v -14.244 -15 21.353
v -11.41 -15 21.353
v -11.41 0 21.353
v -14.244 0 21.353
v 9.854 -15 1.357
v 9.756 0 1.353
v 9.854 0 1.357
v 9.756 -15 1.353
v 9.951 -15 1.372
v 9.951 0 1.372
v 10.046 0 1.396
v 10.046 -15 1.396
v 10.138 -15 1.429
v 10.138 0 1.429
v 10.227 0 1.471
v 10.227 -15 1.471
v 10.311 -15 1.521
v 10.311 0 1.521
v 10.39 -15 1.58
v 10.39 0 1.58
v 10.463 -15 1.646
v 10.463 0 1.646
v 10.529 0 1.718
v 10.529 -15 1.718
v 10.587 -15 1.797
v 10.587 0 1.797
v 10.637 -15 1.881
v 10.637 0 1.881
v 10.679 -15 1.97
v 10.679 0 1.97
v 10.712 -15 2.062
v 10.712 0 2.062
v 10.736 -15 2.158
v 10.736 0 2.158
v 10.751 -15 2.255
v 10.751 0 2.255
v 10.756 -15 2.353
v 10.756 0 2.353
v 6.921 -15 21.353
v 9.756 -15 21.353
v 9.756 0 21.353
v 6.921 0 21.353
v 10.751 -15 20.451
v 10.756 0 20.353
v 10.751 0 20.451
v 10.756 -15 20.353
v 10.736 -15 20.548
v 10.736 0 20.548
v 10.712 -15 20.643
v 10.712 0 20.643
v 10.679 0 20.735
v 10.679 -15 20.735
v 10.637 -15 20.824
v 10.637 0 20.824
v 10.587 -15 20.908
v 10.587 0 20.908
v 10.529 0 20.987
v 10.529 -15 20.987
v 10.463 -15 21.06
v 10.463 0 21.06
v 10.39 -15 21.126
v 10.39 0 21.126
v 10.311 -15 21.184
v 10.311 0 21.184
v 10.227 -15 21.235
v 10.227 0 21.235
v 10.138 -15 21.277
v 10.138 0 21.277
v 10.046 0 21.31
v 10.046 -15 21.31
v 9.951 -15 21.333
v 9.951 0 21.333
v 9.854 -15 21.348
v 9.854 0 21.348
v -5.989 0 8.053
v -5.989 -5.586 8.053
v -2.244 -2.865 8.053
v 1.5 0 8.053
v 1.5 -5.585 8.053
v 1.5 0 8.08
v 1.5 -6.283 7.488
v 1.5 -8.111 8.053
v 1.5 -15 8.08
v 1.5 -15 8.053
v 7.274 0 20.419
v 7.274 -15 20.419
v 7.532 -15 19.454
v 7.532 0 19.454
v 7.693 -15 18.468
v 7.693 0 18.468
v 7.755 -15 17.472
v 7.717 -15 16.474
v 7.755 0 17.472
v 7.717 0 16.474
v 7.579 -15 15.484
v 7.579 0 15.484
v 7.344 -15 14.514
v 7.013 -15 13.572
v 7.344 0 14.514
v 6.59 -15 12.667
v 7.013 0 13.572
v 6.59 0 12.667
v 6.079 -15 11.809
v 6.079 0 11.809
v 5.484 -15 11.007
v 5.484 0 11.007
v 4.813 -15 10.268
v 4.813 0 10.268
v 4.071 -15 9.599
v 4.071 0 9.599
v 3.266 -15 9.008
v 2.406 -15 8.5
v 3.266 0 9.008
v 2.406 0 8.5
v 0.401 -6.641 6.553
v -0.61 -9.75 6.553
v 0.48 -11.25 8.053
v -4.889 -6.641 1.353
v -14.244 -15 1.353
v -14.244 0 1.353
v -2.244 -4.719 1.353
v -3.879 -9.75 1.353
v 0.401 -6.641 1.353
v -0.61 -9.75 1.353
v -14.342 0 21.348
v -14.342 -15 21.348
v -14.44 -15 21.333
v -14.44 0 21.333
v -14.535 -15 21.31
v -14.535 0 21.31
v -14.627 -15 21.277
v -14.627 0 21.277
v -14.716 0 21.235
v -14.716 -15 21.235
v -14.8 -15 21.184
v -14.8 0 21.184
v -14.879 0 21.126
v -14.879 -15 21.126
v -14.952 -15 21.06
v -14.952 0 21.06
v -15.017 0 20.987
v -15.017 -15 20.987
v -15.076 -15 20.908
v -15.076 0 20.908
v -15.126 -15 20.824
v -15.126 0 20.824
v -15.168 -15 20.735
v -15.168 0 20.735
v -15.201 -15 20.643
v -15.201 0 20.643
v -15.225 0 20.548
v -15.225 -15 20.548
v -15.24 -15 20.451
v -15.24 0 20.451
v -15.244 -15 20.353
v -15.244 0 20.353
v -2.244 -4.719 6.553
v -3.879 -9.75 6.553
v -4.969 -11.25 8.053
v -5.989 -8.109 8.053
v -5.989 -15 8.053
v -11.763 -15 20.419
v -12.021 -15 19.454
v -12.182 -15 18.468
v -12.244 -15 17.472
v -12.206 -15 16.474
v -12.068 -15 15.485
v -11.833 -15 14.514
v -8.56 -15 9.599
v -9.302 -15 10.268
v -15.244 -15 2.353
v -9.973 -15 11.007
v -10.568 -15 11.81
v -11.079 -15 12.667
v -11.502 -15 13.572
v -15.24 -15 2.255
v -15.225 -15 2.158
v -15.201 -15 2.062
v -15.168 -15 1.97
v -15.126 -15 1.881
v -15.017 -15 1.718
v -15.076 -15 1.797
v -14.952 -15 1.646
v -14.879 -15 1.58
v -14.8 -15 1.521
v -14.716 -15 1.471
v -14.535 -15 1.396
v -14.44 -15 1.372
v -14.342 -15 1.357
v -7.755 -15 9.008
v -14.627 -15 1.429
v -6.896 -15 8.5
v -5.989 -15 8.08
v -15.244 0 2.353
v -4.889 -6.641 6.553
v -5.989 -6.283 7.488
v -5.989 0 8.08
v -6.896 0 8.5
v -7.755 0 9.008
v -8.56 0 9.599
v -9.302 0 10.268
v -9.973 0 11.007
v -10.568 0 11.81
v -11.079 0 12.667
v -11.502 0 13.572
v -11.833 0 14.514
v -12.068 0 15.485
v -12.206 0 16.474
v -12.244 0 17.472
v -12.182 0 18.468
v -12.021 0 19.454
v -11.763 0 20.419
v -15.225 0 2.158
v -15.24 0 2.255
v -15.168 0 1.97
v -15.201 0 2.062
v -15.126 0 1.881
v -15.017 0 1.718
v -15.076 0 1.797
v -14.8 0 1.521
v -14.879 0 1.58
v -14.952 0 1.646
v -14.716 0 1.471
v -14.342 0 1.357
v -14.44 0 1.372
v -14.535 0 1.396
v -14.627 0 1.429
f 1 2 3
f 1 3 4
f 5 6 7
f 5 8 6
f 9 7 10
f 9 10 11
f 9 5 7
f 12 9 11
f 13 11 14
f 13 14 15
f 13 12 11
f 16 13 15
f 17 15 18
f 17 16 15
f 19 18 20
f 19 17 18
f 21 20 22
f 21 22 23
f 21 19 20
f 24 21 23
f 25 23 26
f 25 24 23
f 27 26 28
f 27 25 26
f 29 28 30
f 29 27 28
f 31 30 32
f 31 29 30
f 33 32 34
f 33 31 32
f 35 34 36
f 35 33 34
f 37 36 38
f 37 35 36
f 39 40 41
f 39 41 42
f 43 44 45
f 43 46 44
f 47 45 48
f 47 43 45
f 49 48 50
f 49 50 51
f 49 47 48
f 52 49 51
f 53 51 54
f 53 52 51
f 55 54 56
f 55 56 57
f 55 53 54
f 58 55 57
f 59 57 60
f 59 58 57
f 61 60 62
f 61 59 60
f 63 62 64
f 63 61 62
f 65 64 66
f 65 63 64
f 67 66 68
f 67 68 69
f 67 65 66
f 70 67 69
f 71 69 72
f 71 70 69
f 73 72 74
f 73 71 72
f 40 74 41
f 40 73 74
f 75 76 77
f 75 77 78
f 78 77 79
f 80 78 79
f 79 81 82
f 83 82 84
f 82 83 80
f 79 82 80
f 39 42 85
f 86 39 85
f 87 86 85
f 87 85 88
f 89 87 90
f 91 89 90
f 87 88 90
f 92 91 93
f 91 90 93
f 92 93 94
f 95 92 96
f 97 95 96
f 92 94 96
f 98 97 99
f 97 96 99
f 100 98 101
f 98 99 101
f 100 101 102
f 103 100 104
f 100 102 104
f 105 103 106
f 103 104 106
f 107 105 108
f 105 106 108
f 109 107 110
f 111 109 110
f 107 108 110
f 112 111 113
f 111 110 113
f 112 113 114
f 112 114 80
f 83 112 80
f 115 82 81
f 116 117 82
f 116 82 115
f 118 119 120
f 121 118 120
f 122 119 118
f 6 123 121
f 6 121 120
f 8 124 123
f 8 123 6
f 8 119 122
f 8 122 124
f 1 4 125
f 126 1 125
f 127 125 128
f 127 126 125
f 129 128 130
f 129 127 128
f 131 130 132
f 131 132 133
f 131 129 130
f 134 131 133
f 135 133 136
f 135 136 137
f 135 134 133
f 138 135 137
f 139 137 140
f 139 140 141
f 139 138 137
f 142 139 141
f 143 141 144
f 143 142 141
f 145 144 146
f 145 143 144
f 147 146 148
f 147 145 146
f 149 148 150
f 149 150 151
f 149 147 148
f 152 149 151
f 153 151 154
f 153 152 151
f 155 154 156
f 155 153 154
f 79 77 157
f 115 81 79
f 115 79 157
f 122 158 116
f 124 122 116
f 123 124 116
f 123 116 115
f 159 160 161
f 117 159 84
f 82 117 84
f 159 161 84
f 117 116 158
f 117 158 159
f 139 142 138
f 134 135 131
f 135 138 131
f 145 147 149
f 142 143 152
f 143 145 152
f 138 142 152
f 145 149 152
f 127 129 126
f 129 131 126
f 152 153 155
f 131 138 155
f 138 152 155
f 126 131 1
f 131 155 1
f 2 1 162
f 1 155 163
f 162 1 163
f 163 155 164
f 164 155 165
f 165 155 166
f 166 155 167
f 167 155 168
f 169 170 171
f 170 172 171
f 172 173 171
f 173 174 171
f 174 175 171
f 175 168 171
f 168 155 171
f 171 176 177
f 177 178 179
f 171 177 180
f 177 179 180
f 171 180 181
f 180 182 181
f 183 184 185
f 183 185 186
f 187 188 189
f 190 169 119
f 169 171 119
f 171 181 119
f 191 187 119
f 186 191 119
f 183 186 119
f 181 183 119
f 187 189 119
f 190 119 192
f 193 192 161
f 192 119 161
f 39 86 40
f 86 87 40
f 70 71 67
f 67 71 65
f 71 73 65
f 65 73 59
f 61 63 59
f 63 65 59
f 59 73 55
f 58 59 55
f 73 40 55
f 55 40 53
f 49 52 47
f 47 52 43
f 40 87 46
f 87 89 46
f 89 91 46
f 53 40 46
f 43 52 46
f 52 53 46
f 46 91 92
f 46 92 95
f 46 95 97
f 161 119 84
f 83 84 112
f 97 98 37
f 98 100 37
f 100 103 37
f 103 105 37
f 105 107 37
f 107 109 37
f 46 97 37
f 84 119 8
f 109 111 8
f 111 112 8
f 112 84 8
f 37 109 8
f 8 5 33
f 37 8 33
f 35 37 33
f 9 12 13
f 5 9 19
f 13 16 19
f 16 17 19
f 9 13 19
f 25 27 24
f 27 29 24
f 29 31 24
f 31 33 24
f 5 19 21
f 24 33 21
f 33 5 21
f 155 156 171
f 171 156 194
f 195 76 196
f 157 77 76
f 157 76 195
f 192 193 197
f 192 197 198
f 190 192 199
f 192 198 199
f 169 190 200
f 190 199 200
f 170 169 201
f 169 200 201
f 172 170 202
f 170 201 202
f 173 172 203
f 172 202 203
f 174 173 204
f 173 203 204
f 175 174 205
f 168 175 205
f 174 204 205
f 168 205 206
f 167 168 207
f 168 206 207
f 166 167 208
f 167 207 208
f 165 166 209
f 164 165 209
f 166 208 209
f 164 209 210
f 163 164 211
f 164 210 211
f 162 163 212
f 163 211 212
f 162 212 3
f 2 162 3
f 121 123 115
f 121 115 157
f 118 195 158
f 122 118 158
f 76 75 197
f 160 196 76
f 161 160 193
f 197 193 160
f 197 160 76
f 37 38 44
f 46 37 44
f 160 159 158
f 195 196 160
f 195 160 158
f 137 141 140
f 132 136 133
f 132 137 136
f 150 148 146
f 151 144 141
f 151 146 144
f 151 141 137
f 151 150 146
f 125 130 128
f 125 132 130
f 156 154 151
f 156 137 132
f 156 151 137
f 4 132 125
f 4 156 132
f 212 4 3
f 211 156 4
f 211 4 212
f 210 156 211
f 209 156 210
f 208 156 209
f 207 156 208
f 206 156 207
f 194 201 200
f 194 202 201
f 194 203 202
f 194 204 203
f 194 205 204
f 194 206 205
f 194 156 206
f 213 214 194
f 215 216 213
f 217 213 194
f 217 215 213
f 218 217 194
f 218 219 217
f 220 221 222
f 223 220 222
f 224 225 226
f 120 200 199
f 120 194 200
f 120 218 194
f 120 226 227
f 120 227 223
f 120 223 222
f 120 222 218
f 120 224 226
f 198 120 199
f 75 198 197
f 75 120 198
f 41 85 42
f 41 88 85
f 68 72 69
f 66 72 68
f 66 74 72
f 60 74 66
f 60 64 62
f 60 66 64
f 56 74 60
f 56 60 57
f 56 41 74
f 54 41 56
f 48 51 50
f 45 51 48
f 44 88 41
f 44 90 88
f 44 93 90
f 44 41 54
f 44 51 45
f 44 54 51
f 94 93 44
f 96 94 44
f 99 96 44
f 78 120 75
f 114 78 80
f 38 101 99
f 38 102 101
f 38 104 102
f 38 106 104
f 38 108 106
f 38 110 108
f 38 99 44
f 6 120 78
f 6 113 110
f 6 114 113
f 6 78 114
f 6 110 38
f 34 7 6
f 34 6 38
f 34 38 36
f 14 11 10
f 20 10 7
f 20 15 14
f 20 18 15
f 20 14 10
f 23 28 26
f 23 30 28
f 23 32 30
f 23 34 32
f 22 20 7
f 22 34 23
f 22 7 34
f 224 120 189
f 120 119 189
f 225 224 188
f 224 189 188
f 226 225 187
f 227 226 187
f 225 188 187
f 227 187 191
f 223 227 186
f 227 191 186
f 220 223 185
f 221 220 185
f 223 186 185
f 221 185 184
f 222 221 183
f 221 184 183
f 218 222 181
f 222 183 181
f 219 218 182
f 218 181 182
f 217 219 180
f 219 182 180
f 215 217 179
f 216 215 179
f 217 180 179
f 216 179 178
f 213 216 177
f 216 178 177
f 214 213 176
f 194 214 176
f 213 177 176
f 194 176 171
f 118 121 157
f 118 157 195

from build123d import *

# Parameters (mm, degrees)
F1_DEPTH     = 15
F3_DEPTH     = 8
F4_W         = 7.4894965633
F4_H         = 15
F5_DEPTH     = 8
F6_DEPTH     = 6.7
F7_T4_DEPTH  = 10.9844903399
F7_T10_DEPTH = 10.9844903399
F7_T16_DEPTH = 10.9844903399
F7_T23_DEPTH = 10.9844903399
F7_T29_DEPTH = 10.9844903399
F7_T37_DEPTH = 10.9844903399
F7_T41_DEPTH = 10.9844903399
F7_T48_DEPTH = 10.9844903399
F7_T53_DEPTH = 10.9844903399
F7_T61_DEPTH = 10.9844903399
F7_T66_DEPTH = 10.9844903399
F7_T74_DEPTH = 10.9844903399
F7_T79_DEPTH = 10.9844903399
F7_T86_DEPTH = 10.9844903399
F7_T91_DEPTH = 10.9844903399
F8_R         = 1


# Not quite as in the source:
# - a fillet or chamfer that OpenCascade refuses, or shapes differently, is made with other operations: its cross-section is extruded or revolved along the edge and cut away or added
# - a feature names something its author has since deleted; it is built from what else it names


with BuildPart() as f1:
    # F0 (on Front) → F1 (new body)
    with BuildSketch(Plane.XZ):
        with BuildLine():
            Line((-11.4096143179, 21.3526541356), (-15.244462928, 21.3526541356))
            Line((-15.244462928, 21.3526541356), (-15.244462928, 1.3526541356))
            Line((-15.244462928, 1.3526541356), (10.755537072, 1.3526541356))
            Line((10.755537072, 1.3526541356), (10.755537072, 21.3526541356))
            Line((10.755537072, 21.3526541356), (6.9206884619, 21.3526541356))
            ThreePointArc((6.9206884619, 21.3526541356), (-2.244462928, 7.3526541356), (-11.4096143179, 21.3526541356))
        make_face()
    extrude(amount=F1_DEPTH)

    # F2 (on face) → F3 (cut)
    with BuildSketch(Plane(origin=(0, 0, 1.3526541356), x_dir=(1, 0, 0), z_dir=(0, 0, -1))):
        Polygon((-0.60974224, 9.75), (-3.879183616, 9.75), (-4.8894965633, 6.6405764747), (-2.244462928, 4.7188470506), (0.4005707074, 6.6405764747), align=None)
    extrude(amount=-F3_DEPTH, mode=Mode.SUBTRACT)

    # F4 (on face) → F5 (cut)
    with BuildSketch(Plane(origin=(0, 0, 1.3526541356), x_dir=(1, 0, 0), z_dir=(0, 0, -1))):
        with Locations((-2.2447482816, 7.5)):
            Rectangle(F4_W, F4_H)
        Polygon((0.4005707074, 6.6405764747), (-2.244462928, 4.7188470506), (-4.8894965633, 6.6405764747), (-3.879183616, 9.75), (-0.60974224, 9.75), align=None, mode=Mode.SUBTRACT)
    extrude(amount=-F5_DEPTH, mode=Mode.SUBTRACT)

    # F4 (on face) → F6 (join)
    with BuildSketch(Plane(origin=(0, 0, 1.3526541356), x_dir=(1, 0, 0), z_dir=(0, 0, -1))):
        with Locations((-2.2447482816, 7.5)):
            Rectangle(F4_W, F4_H)
        Polygon((0.4005707074, 6.6405764747), (-2.244462928, 4.7188470506), (-4.8894965633, 6.6405764747), (-3.879183616, 9.75), (-0.60974224, 9.75), align=None, mode=Mode.SUBTRACT)
    extrude(amount=-F6_DEPTH)

    # F7: chamfer of 1.5 on 5 edges, made by hand


with BuildPart() as f7_tool2:
    # F7_s3 → F7_t4 (new body)
    with BuildSketch(Plane(origin=(-0.5921623143, -0.4302311048, 0), x_dir=(0, 0, 1), z_dir=(-0.8090169944, -0.5877852523, 0))):
        Polygon((8.0526541356, -0.9983652494), (6.5526541356, -2.4983652494), (8.0526541356, -2.4983652494), align=None)
    extrude(amount=F7_T4_DEPTH)

    split(bisect_by=Plane(origin=(-3.0193879884, -4.1558310382, 0), x_dir=(0, 0, 1), z_dir=(-0.5877852523, -0.8090169944, 0)), keep=Keep.TOP)

    split(bisect_by=Plane(origin=(-6.3742076477, -2.0711056126, 0), x_dir=(0, 0, 1), z_dir=(0.9510565163, 0.3090169944, 0)), keep=Keep.TOP)


with BuildPart() as f1_1:
    add(f1.part)

    # F7_t1: cut F7_tool2
    add(f7_tool2.part, mode=Mode.SUBTRACT)


with BuildPart() as f7_tool8:
    # F7_s9 → F7_t10 (new body)
    with BuildSketch(Plane(origin=(6.5407615579, -4.7521414374, 0), x_dir=(0, 0, 1), z_dir=(-0.8090169944, 0.5877852523, 0))):
        Polygon((8.0526541356, -3.6368896662), (6.5526541356, -5.1368896662), (8.0526541356, -5.1368896662), align=None)
    extrude(amount=F7_T10_DEPTH)

    split(bisect_by=Plane(origin=(2.3139360678, -0.7518434043, 0), x_dir=(0, 0, 1), z_dir=(-0.9510565163, 0.3090169944, 0)), keep=Keep.TOP)

    split(bisect_by=Plane(origin=(1.4685022485, -2.021219945, 0), x_dir=(0, 0, 1), z_dir=(0.5877852523, -0.8090169944, 0)), keep=Keep.TOP)


with BuildPart() as f1_2:
    add(f1_1.part)

    # F7_t7: cut F7_tool8
    add(f7_tool8.part, mode=Mode.SUBTRACT)


with BuildPart() as f7_tool14:
    # F7_s15 → F7_t16 (new body)
    with BuildSketch(Plane(origin=(-4.1157189289, -12.6668803911, 0), x_dir=(0, 0, 1), z_dir=(0.3090169944, 0.9510565163, 0))):
        Polygon((8.0526541356, 3.9330163646), (6.5526541356, 2.4330163646), (8.0526541356, 2.4330163646), align=None)
    extrude(amount=F7_T16_DEPTH)

    split(bisect_by=Plane.XZ.offset(9.75), keep=Keep.BOTTOM)

    split(bisect_by=Plane(origin=(-3.0193879884, -4.1558310382, 0), x_dir=(0, 0, 1), z_dir=(-0.5877852523, -0.8090169944, 0)), keep=Keep.TOP)

    split(bisect_by=Plane.YZ.offset(1.5), keep=Keep.BOTTOM)


with BuildPart() as f1_3:
    add(f1_2.part)

    # F7_t13: cut F7_tool14
    add(f7_tool14.part, mode=Mode.SUBTRACT)


with BuildPart() as f7_tool21:
    # F7_s22 → F7_t23 (new body)
    with BuildSketch(Plane.YZ.offset(-7.7367080979)):
        Polygon((-9.75, 6.5526541356), (-11.25, 8.0526541356), (-9.75, 8.0526541356), align=None)
    extrude(amount=F7_T23_DEPTH)

    split(bisect_by=Plane(origin=(2.3139360678, -0.7518434043, 0), x_dir=(0, 0, 1), z_dir=(-0.9510565163, 0.3090169944, 0)), keep=Keep.TOP)

    split(bisect_by=Plane(origin=(-6.3742076477, -2.0711056126, 0), x_dir=(0, 0, 1), z_dir=(0.9510565163, 0.3090169944, 0)), keep=Keep.TOP)


with BuildPart() as f1_4:
    add(f1_3.part)

    # F7_t20: cut F7_tool21
    add(f7_tool21.part, mode=Mode.SUBTRACT)


with BuildPart() as f7_tool27:
    # F7_s28 → F7_t29 (new body)
    with BuildSketch(Plane(origin=(0.2926704633, -0.9007470667, 0), x_dir=(0, 0, 1), z_dir=(0.3090169944, -0.9510565163, 0))):
        Polygon((8.0526541356, 8.202238551), (6.5526541356, 6.702238551), (8.0526541356, 6.702238551), align=None)
    extrude(amount=F7_T29_DEPTH)

    split(bisect_by=Plane.XZ.offset(9.75), keep=Keep.BOTTOM)

    split(bisect_by=Plane.YZ.offset(-5.9894965633), keep=Keep.TOP)

    split(bisect_by=Plane(origin=(1.4685022485, -2.021219945, 0), x_dir=(0, 0, 1), z_dir=(0.5877852523, -0.8090169944, 0)), keep=Keep.TOP)


with BuildPart() as f1_5:
    add(f1_4.part)

    # F7_t26: cut F7_tool27
    add(f7_tool27.part, mode=Mode.SUBTRACT)


with BuildPart() as f7_tool35:
    # F7_s36 → F7_t37 (new body)
    with BuildSketch(Plane(origin=(6.5407615579, -4.7521414374, 0), x_dir=(0, 0, 1), z_dir=(-0.8090169944, 0.5877852523, 0))):
        Polygon((8.0526541356, -3.6368896662), (6.5526541356, -5.1368896662), (8.0526541356, -5.1368896662), align=None)
    extrude(amount=F7_T37_DEPTH)

    split(bisect_by=Plane(origin=(1.4685022485, -2.021219945, 0), x_dir=(0, 0, 1), z_dir=(-0.5877852523, 0.8090169944, 0)), keep=Keep.TOP)


with BuildPart() as f7_tool39:
    # F7_s40 → F7_t41 (new body)
    with BuildSketch(Plane(origin=(-0.5921623143, -0.4302311048, 0), x_dir=(0, 0, 1), z_dir=(-0.8090169944, -0.5877852523, 0))):
        Polygon((8.0526541356, -0.9983652494), (6.5526541356, -2.4983652494), (8.0526541356, -2.4983652494), align=None)
    extrude(amount=F7_T41_DEPTH)

    split(bisect_by=Plane(origin=(-3.0193879884, -4.1558310382, 0), x_dir=(0, 0, 1), z_dir=(0.5877852523, 0.8090169944, 0)), keep=Keep.TOP)


with BuildPart() as f7_tool35_1:
    add(f7_tool35.part)

    # F7_t43: intersect F7_tool39
    add(f7_tool39.part, mode=Mode.INTERSECT)


with BuildPart() as f1_6:
    add(f1_5.part)

    # F7_t33: cut F7_tool35
    add(f7_tool35_1.part, mode=Mode.SUBTRACT)


with BuildPart() as f7_tool46:
    # F7_s47 → F7_t48 (new body)
    with BuildSketch(Plane(origin=(-0.5921623143, -0.4302311048, 0), x_dir=(0, 0, 1), z_dir=(-0.8090169944, -0.5877852523, 0))):
        Polygon((8.0526541356, -0.9983652494), (6.5526541356, -2.4983652494), (8.0526541356, -2.4983652494), align=None)
    extrude(amount=F7_T48_DEPTH)

    split(bisect_by=Plane.YZ.offset(-5.9894965633), keep=Keep.TOP)

    split(bisect_by=Plane(origin=(-6.3742076477, -2.0711056126, 0), x_dir=(0, 0, 1), z_dir=(-0.9510565163, -0.3090169944, 0)), keep=Keep.TOP)


with BuildPart() as f7_tool51:
    # F7_s52 → F7_t53 (new body)
    with BuildSketch(Plane(origin=(0.2926704633, -0.9007470667, 0), x_dir=(0, 0, 1), z_dir=(0.3090169944, -0.9510565163, 0))):
        Polygon((8.0526541356, 8.202238551), (6.5526541356, 6.702238551), (8.0526541356, 6.702238551), align=None)
    extrude(amount=F7_T53_DEPTH)

    split(bisect_by=Plane.YZ.offset(-5.9894965633), keep=Keep.TOP)

    split(bisect_by=Plane(origin=(1.4685022485, -2.021219945, 0), x_dir=(0, 0, 1), z_dir=(-0.5877852523, 0.8090169944, 0)), keep=Keep.TOP)


with BuildPart() as f7_tool46_1:
    add(f7_tool46.part)

    # F7_t56: intersect F7_tool51
    add(f7_tool51.part, mode=Mode.INTERSECT)


with BuildPart() as f1_7:
    add(f1_6.part)

    # F7_t44: cut F7_tool46
    add(f7_tool46_1.part, mode=Mode.SUBTRACT)


with BuildPart() as f7_tool59:
    # F7_s60 → F7_t61 (new body)
    with BuildSketch(Plane(origin=(-4.1157189289, -12.6668803911, 0), x_dir=(0, 0, 1), z_dir=(0.3090169944, 0.9510565163, 0))):
        Polygon((8.0526541356, 3.9330163646), (6.5526541356, 2.4330163646), (8.0526541356, 2.4330163646), align=None)
    extrude(amount=F7_T61_DEPTH)

    split(bisect_by=Plane(origin=(-3.0193879884, -4.1558310382, 0), x_dir=(0, 0, 1), z_dir=(0.5877852523, 0.8090169944, 0)), keep=Keep.TOP)

    split(bisect_by=Plane.YZ.offset(1.5), keep=Keep.BOTTOM)


with BuildPart() as f7_tool64:
    # F7_s65 → F7_t66 (new body)
    with BuildSketch(Plane(origin=(6.5407615579, -4.7521414374, 0), x_dir=(0, 0, 1), z_dir=(-0.8090169944, 0.5877852523, 0))):
        Polygon((8.0526541356, -3.6368896662), (6.5526541356, -5.1368896662), (8.0526541356, -5.1368896662), align=None)
    extrude(amount=F7_T66_DEPTH)

    split(bisect_by=Plane(origin=(2.3139360678, -0.7518434043, 0), x_dir=(0, 0, 1), z_dir=(0.9510565163, -0.3090169944, 0)), keep=Keep.TOP)

    split(bisect_by=Plane.YZ.offset(1.5), keep=Keep.BOTTOM)


with BuildPart() as f7_tool59_1:
    add(f7_tool59.part)

    # F7_t69: intersect F7_tool64
    add(f7_tool64.part, mode=Mode.INTERSECT)


with BuildPart() as f1_8:
    add(f1_7.part)

    # F7_t57: cut F7_tool59
    add(f7_tool59_1.part, mode=Mode.SUBTRACT)


with BuildPart() as f7_tool72:
    # F7_s73 → F7_t74 (new body)
    with BuildSketch(Plane.YZ.offset(-7.7367080979)):
        Polygon((-9.75, 6.5526541356), (-11.25, 8.0526541356), (-9.75, 8.0526541356), align=None)
    extrude(amount=F7_T74_DEPTH)

    split(bisect_by=Plane(origin=(2.3139360678, -0.7518434043, 0), x_dir=(0, 0, 1), z_dir=(0.9510565163, -0.3090169944, 0)), keep=Keep.TOP)

    split(bisect_by=Plane.YZ.offset(1.5), keep=Keep.BOTTOM)


with BuildPart() as f7_tool77:
    # F7_s78 → F7_t79 (new body)
    with BuildSketch(Plane(origin=(-4.1157189289, -12.6668803911, 0), x_dir=(0, 0, 1), z_dir=(0.3090169944, 0.9510565163, 0))):
        Polygon((8.0526541356, 3.9330163646), (6.5526541356, 2.4330163646), (8.0526541356, 2.4330163646), align=None)
    extrude(amount=F7_T79_DEPTH)

    split(bisect_by=Plane.XZ.offset(9.75), keep=Keep.TOP)


with BuildPart() as f7_tool72_1:
    add(f7_tool72.part)

    # F7_t81: intersect F7_tool77
    add(f7_tool77.part, mode=Mode.INTERSECT)


with BuildPart() as f1_9:
    add(f1_8.part)

    # F7_t70: cut F7_tool72
    add(f7_tool72_1.part, mode=Mode.SUBTRACT)


with BuildPart() as f7_tool84:
    # F7_s85 → F7_t86 (new body)
    with BuildSketch(Plane.YZ.offset(-7.7367080979)):
        Polygon((-9.75, 6.5526541356), (-11.25, 8.0526541356), (-9.75, 8.0526541356), align=None)
    extrude(amount=F7_T86_DEPTH)

    split(bisect_by=Plane.YZ.offset(-5.9894965633), keep=Keep.TOP)

    split(bisect_by=Plane(origin=(-6.3742076477, -2.0711056126, 0), x_dir=(0, 0, 1), z_dir=(-0.9510565163, -0.3090169944, 0)), keep=Keep.TOP)


with BuildPart() as f7_tool89:
    # F7_s90 → F7_t91 (new body)
    with BuildSketch(Plane(origin=(0.2926704633, -0.9007470667, 0), x_dir=(0, 0, 1), z_dir=(0.3090169944, -0.9510565163, 0))):
        Polygon((8.0526541356, 8.202238551), (6.5526541356, 6.702238551), (8.0526541356, 6.702238551), align=None)
    extrude(amount=F7_T91_DEPTH)

    split(bisect_by=Plane.XZ.offset(9.75), keep=Keep.TOP)


with BuildPart() as f7_tool84_1:
    add(f7_tool84.part)

    # F7_t93: intersect F7_tool89
    add(f7_tool89.part, mode=Mode.INTERSECT)


with BuildPart() as f1_10:
    add(f1_9.part)

    # F7_t82: cut F7_tool84
    add(f7_tool84_1.part, mode=Mode.SUBTRACT)

    # F8
    f8_edges = [f1_10.edges().sort_by_distance(p)[0] for p in [
        (-15.244463, -7.5, 21.352654),
        (10.755537, -7.5, 21.352654),
        (10.755537, -7.5, 1.352654),
        (-15.244463, -7.5, 1.352654),
    ]]
    fillet(f8_edges, radius=F8_R)


solid = f1_10.part
